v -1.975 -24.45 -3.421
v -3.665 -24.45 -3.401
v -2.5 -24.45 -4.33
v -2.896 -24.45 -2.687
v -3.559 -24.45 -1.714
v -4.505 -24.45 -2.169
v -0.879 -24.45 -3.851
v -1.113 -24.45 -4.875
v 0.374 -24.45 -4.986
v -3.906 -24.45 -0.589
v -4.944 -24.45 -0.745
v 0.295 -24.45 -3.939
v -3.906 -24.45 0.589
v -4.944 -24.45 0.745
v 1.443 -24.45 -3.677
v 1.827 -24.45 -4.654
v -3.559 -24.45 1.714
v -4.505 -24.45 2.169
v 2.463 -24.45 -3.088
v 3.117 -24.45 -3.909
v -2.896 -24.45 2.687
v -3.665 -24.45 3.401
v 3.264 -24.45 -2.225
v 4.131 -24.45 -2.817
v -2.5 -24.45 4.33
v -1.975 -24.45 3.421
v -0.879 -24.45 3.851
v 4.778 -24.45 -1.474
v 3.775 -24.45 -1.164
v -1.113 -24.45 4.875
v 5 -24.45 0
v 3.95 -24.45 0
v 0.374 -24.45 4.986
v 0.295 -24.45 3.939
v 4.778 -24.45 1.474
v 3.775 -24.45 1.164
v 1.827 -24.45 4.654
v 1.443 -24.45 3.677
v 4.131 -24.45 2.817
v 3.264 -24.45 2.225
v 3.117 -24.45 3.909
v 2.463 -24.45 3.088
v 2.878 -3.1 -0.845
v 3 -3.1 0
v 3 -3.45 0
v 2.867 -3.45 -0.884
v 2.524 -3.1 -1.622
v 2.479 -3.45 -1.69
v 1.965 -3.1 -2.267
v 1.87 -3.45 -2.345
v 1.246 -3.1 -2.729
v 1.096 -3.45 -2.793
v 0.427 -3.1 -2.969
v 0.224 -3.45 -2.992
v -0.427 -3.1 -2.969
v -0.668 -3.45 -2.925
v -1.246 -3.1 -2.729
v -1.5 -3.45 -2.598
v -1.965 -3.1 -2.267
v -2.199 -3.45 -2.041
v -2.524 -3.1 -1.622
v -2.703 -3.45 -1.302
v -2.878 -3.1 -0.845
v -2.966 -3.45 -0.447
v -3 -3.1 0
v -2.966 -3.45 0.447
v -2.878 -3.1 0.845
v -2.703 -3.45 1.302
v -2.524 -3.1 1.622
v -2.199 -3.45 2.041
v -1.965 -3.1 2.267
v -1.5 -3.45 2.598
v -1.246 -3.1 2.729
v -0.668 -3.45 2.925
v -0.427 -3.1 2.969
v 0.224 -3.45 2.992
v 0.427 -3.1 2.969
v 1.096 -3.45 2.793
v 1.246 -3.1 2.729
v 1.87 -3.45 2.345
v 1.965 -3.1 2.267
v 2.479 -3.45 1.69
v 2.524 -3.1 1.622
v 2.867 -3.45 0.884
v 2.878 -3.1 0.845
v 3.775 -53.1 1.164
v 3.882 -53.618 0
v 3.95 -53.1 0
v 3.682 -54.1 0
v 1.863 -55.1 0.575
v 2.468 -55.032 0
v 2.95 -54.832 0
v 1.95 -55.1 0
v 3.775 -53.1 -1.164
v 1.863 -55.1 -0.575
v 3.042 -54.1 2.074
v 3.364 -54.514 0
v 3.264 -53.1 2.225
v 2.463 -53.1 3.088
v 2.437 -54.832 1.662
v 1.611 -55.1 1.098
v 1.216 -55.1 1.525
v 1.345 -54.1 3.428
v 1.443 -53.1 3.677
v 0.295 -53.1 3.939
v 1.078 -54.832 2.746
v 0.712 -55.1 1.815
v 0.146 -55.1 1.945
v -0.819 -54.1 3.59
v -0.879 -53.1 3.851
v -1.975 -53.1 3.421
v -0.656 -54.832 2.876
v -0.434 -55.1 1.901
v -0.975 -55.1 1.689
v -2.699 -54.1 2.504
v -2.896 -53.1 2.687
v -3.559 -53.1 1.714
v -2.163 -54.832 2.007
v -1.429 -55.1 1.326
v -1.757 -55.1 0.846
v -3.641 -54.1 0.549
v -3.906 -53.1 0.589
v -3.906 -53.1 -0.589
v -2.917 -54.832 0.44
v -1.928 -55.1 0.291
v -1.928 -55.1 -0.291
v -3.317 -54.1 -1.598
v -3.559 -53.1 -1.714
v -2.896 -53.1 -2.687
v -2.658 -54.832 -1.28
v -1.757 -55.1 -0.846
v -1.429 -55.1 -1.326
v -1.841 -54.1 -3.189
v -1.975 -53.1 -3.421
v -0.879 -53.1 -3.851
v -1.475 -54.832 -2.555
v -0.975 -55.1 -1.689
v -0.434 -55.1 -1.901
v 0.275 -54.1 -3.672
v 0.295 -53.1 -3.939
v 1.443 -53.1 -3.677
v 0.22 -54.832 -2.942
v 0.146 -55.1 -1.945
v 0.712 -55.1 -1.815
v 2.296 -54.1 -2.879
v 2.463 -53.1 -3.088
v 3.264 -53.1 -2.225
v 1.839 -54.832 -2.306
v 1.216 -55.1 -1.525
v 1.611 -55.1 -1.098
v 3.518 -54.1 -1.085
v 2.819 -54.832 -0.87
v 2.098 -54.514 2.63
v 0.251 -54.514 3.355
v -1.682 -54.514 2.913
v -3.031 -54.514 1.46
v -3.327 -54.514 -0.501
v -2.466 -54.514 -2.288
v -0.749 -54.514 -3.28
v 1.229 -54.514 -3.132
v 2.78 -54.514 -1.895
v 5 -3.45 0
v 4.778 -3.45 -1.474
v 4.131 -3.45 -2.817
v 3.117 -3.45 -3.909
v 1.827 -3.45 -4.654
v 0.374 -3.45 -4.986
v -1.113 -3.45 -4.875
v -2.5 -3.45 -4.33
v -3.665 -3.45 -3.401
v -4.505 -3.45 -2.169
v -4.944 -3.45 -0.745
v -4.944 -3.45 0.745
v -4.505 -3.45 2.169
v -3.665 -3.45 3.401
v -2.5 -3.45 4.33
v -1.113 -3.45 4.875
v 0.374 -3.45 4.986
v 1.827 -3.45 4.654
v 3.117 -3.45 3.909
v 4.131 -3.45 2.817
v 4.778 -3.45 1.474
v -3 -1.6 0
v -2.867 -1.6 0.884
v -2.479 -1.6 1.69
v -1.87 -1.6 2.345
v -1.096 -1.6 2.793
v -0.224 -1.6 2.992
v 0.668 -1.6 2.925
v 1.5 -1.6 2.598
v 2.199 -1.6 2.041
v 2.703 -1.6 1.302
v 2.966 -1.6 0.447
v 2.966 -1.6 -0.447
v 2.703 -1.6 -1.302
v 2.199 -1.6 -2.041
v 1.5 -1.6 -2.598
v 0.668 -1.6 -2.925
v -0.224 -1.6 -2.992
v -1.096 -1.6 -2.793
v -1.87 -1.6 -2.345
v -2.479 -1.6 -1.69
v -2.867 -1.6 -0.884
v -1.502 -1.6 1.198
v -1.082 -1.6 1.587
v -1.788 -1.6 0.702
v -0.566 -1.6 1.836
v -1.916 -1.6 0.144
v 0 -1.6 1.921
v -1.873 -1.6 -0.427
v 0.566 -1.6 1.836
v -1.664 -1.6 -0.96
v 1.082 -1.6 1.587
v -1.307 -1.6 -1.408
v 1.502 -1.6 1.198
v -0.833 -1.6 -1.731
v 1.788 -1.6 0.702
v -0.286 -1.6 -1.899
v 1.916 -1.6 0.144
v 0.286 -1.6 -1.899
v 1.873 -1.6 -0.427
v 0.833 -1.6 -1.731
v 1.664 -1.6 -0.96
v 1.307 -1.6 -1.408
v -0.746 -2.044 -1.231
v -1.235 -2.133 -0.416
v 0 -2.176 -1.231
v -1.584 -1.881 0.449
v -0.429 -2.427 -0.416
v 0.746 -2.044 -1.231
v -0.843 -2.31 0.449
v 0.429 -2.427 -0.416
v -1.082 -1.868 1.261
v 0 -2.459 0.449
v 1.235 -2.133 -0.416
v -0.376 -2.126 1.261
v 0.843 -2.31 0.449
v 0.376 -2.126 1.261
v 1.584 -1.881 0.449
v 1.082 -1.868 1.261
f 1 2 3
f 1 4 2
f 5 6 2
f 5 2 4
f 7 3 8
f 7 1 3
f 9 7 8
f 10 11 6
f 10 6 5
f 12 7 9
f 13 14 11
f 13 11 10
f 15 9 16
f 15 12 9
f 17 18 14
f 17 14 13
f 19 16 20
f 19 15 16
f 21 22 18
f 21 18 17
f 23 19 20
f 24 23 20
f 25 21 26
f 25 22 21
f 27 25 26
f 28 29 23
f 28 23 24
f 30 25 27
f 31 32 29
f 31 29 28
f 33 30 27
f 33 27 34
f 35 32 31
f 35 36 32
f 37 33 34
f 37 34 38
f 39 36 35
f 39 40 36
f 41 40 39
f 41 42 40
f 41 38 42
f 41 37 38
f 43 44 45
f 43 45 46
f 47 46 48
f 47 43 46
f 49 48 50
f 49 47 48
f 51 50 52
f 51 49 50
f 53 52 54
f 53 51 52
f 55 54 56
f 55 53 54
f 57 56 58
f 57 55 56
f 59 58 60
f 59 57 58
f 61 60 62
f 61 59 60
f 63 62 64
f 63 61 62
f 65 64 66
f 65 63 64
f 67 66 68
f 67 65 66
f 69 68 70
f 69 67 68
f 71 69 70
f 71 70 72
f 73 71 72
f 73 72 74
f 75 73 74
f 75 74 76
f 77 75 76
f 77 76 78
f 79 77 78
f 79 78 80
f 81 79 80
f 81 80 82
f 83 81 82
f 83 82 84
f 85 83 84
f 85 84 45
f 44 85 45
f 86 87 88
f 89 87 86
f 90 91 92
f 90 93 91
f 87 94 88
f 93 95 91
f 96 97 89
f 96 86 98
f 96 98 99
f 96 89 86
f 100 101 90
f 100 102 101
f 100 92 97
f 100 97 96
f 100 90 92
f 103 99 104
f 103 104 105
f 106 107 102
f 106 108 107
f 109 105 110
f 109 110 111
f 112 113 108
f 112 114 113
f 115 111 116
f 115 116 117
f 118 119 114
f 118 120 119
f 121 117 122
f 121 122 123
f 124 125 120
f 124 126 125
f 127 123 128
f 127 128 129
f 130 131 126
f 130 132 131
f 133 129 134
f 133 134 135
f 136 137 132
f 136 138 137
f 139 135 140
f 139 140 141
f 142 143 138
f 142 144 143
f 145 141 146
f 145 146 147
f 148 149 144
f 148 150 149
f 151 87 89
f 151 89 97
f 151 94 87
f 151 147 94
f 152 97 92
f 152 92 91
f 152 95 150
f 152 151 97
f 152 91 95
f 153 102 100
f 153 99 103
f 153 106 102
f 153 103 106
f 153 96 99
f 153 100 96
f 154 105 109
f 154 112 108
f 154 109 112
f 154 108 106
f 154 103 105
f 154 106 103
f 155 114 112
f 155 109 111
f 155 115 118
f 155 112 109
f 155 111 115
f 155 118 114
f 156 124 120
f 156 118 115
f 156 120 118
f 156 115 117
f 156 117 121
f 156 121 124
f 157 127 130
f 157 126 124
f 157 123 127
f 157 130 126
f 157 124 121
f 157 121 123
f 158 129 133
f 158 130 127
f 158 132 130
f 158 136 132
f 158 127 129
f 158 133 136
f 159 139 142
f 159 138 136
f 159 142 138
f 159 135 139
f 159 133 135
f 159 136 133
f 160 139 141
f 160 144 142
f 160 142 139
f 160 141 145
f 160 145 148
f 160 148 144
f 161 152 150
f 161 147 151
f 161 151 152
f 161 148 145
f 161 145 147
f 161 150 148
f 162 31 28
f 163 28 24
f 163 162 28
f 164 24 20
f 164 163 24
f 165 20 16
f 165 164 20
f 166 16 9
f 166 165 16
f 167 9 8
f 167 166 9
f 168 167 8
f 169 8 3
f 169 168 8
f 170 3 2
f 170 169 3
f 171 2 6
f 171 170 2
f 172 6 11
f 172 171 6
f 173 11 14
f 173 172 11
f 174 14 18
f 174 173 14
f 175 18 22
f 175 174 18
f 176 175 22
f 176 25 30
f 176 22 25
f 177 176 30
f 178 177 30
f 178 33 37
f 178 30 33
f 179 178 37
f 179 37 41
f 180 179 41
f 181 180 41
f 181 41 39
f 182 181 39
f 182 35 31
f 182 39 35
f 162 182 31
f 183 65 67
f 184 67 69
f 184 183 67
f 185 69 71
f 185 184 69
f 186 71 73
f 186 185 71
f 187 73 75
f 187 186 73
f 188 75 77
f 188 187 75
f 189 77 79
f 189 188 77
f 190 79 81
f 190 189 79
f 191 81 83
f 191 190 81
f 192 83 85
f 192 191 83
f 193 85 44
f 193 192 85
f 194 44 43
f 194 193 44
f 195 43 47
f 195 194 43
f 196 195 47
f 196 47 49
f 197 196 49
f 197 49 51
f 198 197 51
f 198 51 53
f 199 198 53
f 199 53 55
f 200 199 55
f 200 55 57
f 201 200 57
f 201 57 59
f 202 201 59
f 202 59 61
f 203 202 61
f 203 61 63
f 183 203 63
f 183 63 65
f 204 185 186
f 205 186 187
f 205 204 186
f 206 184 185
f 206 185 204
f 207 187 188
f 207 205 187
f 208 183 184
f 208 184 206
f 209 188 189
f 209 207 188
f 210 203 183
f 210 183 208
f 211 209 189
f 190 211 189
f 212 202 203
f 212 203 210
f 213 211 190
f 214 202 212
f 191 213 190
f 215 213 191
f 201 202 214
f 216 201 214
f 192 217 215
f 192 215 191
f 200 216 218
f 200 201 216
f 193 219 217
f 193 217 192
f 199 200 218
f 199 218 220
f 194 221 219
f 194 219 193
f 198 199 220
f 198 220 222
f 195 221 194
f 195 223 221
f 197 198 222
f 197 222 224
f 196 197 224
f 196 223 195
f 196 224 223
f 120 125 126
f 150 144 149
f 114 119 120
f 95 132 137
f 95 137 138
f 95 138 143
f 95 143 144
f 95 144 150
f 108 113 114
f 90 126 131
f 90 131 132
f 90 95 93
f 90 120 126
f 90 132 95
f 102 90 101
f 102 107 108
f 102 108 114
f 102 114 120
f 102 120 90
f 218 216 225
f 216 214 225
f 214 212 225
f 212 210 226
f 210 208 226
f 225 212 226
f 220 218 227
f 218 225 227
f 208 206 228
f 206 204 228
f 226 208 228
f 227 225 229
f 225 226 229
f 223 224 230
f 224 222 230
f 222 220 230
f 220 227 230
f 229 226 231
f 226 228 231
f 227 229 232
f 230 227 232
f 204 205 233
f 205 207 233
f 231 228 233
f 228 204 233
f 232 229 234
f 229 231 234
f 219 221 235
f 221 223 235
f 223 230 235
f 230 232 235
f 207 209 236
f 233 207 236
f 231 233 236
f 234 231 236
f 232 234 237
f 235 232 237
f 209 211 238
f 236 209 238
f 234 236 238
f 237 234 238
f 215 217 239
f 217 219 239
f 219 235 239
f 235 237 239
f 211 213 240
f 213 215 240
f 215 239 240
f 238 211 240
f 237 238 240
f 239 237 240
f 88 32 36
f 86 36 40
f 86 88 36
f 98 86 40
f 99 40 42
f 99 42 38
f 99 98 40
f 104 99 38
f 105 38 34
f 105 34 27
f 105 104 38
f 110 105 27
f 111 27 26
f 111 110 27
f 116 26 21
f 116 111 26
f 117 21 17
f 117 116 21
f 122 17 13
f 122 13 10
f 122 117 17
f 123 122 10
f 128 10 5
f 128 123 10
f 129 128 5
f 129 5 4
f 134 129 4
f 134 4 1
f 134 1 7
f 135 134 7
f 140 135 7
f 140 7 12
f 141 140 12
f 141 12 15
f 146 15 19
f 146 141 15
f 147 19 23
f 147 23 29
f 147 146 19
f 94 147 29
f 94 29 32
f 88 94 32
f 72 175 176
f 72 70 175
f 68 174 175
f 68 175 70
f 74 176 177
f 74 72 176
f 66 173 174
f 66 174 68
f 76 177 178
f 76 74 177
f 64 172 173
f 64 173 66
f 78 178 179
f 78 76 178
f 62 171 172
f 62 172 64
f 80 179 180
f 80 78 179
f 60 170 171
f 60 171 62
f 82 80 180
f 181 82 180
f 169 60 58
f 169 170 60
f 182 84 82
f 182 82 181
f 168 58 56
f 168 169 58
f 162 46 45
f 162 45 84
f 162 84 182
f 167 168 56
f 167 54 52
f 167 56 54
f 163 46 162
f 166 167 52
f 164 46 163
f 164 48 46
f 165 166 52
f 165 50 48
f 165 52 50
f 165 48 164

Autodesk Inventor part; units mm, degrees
ref_plane "YZ Plane" through (0, 0, 0) normal (1, 0, 0) x (0, 1, 0)
ref_plane "XZ Plane" through (0, 0, 0) normal (0, 1, 0) x (-1, 0, 0)
ref_plane "XY Plane" through (0, 0, 0) normal (0, 0, 1) x (1, 0, 0)
sketch "Sketch1" plane through (0, 0, 0) normal (0, 1, 0) x (-1, 0, 0)
  circle A0 centre (0, 0) radius 2.5
  circle A1 centre (0, 0) radius 3
  line L0 (0, 2.5) -> (0, -2.5)
  dimension "d0" = 5
  dimension "d1" = 6
extrude "Extrusion1" add sketch "Sketch1" against normal blind 15 contours A0 L0 | L0 A0 | A1
revolve "Revolution1" cut sketch "Sketch1" angle 360 about axis through (0, 0, 2.5) along (0, 0, -1) picked at (0.5196, 0.6515) contours A0 L0
sketch "Sketch2" plane through (0, 0, 0) normal (0, 1, 0) x (1, 0, 0)
  circle A0 centre (0, 0) radius 3 projected
  circle A1 centre (0, 0) radius 2.5 projected
extrude "Extrusion2" cut sketch "Sketch2" against normal blind 1.1 contours A0 | A1
sketch "Sketch3" plane through (0, -15, 0) normal (0, -1, 0) x (1, 0, 0)
  circle A0 centre (0, 0) radius 5
  circle A1 centre (0, 0) radius 3 projected
  dimension "d7" = 10
extrude "Extrusion3" add sketch "Sketch3" against normal blind 10
sketch "Sketch4" plane through (0, -15, 0) normal (0, -1, 0) x (1, 0, 0)
  circle A0 centre (0, 0) radius 5 projected
extrude "Extrusion4" cut sketch "Sketch4" against normal blind 5
sketch "Sketch5" plane through (0, -10, 0) normal (0, -1, 0) x (1, 0, 0)
  circle A0 centre (0, 0) radius 3.95
  dimension "d12" = 7.9
extrude "Extrusion5" add sketch "Sketch5" along normal blind 45
sketch "Sketch6" plane through (0, -5, 0) normal (0, 1, 0) x (1, 0, 0)
  circle A0 centre (0, 0) radius 3 projected
  circle A1 centre (0, 0) radius 5 projected
extrude "Extrusion6" cut sketch "Sketch6" against normal blind 0.1
sketch "Sketch7" plane through (0, -10, 0) normal (0, -1, 0) x (1, 0, 0)
  circle A0 centre (0, 0) radius 5 projected
  circle A1 centre (0, 0) radius 3.95 projected
extrude "Extrusion7" add sketch "Sketch7" along normal blind 0.1
sketch "Sketch8" plane through (0, -55, 0) normal (0, -1, 0) x (1, 0, 0)
  circle A0 centre (0, 0) radius 3.95 projected
extrude "Extrusion8" add sketch "Sketch8" along normal blind 0.1
sketch "Sketch9" plane through (0, -5.1, 0) normal (0, 1, 0) x (1, 0, 0)
  circle A0 centre (0, 0) radius 5 projected
extrude "Extrusion9" add sketch "Sketch9" along normal blind 2
sketch "Sketch10" plane through (0, -10.1, 0) normal (0, -1, 0) x (1, 0, 0)
  circle A0 centre (0, 0) radius 5 projected
  circle A1 centre (0, 0) radius 3.95 projected
extrude "Extrusion10" cut sketch "Sketch10" against normal blind 2
extrude "Extrusion11" add sketch "Sketch10" against normal blind 2
extrude "Extrusion12" add sketch "Sketch10" along normal blind 14.7
sketch "Sketch11" plane through (0, -1.1, 0) normal (0, 1, 0) x (1, 0, 0)
  circle A0 centre (0, 0) radius 3 projected
extrude "Extrusion13" cut sketch "Sketch11" against normal blind 0.3
sketch "Sketch12" plane through (0, -3.1, 0) normal (0, 1, 0) x (1, 0, 0)
  circle A0 centre (0, 0) radius 5 projected
  circle A1 centre (0, 0) radius 3 projected
extrude "Extrusion14" cut sketch "Sketch12" against normal blind 0.35
sketch "Sketch13" plane through (0, -24.8, 0) normal (0, -1, 0) x (1, 0, 0)
  circle A0 centre (0, 0) radius 3.95 projected
  circle A1 centre (0, 0) radius 5 projected
extrude "Extrusion15" cut sketch "Sketch13" against normal blind 0.35
sketch "Sketch14" plane through (0, -1.4, 0) normal (0, 1, 0) x (1, 0, 0)
  circle A0 centre (0, 0) radius 2.0712 projected
  circle A1 centre (0, 0) radius 3 projected
extrude "Extrusion16" cut sketch "Sketch14" against normal blind 0.2 contours A0 | A1
fillet "Fillet1" radius 2 1 edges at (-3.95, -55.1, 0)
properties part number "BARRA V3_3DPrint"
